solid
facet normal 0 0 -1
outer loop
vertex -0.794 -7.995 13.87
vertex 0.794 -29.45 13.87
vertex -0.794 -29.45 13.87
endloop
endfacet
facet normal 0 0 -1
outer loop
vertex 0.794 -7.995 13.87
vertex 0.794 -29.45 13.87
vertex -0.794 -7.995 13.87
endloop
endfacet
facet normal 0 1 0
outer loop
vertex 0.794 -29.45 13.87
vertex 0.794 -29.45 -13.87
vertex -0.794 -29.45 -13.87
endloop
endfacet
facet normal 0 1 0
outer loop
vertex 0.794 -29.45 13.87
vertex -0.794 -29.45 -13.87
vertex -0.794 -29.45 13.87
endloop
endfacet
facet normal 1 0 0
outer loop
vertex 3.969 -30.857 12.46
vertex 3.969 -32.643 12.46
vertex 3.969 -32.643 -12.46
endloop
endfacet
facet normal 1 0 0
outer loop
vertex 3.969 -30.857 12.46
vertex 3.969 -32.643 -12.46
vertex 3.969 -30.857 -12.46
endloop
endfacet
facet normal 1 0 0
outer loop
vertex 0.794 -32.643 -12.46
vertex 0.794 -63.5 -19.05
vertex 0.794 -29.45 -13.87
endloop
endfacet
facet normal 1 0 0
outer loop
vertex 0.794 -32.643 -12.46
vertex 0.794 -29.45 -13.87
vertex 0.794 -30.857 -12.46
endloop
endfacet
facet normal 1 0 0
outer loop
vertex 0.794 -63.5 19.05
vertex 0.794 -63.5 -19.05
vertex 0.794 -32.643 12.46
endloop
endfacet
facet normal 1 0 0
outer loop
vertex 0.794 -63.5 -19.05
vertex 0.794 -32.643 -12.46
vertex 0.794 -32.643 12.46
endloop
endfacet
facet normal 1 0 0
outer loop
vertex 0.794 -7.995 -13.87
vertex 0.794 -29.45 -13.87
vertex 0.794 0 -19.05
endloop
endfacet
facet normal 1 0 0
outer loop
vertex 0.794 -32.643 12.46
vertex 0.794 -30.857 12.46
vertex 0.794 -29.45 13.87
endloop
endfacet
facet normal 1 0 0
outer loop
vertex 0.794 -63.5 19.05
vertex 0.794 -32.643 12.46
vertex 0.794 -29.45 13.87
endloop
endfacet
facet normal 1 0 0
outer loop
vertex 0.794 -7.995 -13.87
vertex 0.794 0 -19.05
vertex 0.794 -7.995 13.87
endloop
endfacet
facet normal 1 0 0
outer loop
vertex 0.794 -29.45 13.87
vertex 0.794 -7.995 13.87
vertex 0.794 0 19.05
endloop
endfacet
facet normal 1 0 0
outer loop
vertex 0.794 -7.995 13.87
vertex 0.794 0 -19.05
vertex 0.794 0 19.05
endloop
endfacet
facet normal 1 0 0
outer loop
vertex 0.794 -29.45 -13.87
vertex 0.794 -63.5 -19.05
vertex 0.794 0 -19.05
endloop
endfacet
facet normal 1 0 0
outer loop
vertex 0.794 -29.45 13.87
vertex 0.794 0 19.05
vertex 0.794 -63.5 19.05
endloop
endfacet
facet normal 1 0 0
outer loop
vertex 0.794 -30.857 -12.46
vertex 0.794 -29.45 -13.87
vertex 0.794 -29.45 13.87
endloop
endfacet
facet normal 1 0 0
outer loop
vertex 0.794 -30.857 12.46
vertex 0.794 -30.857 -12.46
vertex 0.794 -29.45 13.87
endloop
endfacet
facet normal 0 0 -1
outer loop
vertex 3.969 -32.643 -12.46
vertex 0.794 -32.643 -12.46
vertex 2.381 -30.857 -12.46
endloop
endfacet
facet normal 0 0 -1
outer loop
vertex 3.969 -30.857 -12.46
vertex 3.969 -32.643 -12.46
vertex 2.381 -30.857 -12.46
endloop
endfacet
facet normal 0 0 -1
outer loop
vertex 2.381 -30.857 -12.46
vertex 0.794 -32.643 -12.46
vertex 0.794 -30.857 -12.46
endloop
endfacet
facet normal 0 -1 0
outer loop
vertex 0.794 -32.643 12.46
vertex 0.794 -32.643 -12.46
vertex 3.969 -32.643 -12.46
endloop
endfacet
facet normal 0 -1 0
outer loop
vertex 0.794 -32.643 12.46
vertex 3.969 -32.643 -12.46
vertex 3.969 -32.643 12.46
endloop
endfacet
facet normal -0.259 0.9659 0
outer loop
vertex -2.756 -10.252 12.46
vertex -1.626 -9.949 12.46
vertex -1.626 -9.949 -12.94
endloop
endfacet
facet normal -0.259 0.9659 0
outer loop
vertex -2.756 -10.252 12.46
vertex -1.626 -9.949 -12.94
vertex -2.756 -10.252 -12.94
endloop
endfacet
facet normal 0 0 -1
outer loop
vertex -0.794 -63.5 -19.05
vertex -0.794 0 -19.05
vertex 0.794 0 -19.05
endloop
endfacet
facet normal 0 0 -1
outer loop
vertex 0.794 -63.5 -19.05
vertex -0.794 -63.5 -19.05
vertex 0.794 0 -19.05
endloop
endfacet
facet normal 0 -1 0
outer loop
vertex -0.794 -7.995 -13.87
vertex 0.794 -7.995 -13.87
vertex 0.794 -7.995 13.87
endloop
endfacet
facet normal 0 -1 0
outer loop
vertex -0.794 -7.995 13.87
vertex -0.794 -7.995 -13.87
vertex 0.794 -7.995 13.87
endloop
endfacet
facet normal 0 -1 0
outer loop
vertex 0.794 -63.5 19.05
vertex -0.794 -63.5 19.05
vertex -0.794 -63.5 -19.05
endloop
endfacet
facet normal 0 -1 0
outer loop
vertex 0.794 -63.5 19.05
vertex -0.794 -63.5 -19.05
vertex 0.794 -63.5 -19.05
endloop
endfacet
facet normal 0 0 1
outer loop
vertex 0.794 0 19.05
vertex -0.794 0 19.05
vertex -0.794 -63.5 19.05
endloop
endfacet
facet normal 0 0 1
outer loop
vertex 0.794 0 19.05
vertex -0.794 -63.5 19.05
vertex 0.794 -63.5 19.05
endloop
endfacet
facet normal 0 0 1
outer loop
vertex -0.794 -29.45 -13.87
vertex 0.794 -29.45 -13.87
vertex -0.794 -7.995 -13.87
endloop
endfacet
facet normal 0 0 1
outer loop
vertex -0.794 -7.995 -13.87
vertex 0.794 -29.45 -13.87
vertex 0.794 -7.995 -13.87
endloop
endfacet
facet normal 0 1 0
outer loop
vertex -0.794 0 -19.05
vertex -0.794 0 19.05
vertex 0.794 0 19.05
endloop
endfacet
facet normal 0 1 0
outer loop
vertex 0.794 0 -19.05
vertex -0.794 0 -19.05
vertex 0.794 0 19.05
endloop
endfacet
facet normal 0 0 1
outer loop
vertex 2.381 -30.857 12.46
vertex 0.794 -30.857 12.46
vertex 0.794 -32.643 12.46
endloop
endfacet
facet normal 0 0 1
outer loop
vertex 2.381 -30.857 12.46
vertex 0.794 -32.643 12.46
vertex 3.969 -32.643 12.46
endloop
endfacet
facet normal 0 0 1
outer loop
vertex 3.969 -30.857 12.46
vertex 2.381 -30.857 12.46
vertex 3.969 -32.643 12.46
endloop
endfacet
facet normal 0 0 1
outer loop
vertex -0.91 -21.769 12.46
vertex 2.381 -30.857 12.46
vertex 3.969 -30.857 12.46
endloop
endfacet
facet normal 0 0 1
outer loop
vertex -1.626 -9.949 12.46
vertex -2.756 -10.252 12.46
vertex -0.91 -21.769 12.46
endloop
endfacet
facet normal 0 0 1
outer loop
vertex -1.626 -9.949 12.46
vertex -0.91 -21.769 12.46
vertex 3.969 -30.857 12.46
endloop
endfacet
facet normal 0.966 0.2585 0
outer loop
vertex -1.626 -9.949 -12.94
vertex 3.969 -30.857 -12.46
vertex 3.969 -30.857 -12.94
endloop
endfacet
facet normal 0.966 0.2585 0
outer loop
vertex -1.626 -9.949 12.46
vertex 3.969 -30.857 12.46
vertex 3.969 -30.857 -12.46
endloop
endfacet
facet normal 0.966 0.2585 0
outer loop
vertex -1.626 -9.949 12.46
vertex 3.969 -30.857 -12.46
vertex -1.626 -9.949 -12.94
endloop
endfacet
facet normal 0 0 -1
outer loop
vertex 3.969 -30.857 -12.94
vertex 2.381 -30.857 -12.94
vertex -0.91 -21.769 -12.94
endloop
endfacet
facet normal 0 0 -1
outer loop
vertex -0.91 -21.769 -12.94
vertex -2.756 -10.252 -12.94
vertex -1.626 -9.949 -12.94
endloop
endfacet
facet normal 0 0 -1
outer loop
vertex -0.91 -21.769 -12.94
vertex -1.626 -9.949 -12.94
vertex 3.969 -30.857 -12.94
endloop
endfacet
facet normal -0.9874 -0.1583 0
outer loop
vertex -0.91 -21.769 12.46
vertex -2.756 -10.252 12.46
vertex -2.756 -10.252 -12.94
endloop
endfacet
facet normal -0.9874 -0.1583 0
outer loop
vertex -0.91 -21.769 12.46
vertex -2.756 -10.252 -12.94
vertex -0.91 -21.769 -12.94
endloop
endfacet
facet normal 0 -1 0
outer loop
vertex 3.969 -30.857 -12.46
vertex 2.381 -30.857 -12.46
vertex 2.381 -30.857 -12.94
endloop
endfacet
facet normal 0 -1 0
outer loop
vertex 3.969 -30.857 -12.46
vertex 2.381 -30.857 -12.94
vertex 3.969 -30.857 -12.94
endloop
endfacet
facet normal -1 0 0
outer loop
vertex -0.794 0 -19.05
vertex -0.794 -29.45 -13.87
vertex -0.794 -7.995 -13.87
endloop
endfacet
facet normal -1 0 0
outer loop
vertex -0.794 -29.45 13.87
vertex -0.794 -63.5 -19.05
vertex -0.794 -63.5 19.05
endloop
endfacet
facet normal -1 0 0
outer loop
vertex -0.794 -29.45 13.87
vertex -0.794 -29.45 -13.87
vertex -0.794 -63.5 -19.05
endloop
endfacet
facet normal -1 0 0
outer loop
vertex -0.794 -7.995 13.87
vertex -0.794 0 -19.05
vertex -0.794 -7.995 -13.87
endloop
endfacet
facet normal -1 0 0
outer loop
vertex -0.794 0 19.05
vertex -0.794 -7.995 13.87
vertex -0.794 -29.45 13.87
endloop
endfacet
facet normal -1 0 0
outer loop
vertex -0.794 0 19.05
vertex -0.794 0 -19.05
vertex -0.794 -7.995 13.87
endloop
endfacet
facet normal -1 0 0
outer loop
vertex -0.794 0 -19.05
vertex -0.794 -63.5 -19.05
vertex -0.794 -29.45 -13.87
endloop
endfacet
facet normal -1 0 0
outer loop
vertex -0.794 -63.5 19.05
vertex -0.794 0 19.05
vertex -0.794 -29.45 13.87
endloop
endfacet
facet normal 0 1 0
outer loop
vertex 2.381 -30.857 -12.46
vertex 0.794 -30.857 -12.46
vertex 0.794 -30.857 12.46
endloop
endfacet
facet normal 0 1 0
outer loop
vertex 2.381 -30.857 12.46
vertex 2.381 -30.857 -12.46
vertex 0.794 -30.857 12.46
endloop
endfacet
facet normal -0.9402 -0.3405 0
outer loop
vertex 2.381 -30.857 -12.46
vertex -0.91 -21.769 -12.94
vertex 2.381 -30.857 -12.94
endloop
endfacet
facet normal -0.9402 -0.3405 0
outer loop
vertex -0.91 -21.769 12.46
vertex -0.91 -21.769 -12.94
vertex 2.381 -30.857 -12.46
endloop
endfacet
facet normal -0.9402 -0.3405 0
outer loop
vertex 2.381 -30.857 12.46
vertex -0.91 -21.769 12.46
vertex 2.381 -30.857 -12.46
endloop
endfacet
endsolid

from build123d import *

# Parameters (mm, degrees)
F0_W          = 1.5875
F0_H          = 38.1
F1_DEPTH      = 63.5
F2_W          = 1.78622
F2_H          = 24.92076
F3_DEPTH      = 3.175
F5_W          = 21.454677
F5_H          = 27.739912
F6_DEPTH      = 25.4
F6_DEPTH_BACK = 25.4
F7_DEPTH      = 25.4


with BuildPart() as f1:
    # F0 (on Front) → F1 (new body)
    with BuildSketch(Plane.XZ):
        Rectangle(F0_W, F0_H)
    extrude(amount=F1_DEPTH)

    # F2 (on face) → F3 (join)
    with BuildSketch(Plane.YZ.offset(0.79375)):
        with Locations((-31.75, 0)):
            Rectangle(F2_W, F2_H)
    extrude(amount=F3_DEPTH)

    # F5 (on face) → F6 (cut, two sides)
    with BuildSketch(Plane.YZ.offset(0.79375)) as f6_sk:
        with Locations((-18.722475, 0)):
            Rectangle(F5_W, F5_H)
    extrude(amount=-F6_DEPTH, mode=Mode.SUBTRACT)
    extrude(f6_sk.sketch, amount=-F6_DEPTH_BACK, mode=Mode.SUBTRACT)

    # F4 (on face) → F7 (join)
    with BuildSketch(Plane.XY.offset(12.46038)):
        Polygon((2.38125, -30.85689), (3.96875, -30.85689), (-1.625961, -9.949325), (-2.755997, -10.251714), (-0.909572, -21.768624), align=None)
    extrude(amount=-F7_DEPTH)


solid = f1.part
